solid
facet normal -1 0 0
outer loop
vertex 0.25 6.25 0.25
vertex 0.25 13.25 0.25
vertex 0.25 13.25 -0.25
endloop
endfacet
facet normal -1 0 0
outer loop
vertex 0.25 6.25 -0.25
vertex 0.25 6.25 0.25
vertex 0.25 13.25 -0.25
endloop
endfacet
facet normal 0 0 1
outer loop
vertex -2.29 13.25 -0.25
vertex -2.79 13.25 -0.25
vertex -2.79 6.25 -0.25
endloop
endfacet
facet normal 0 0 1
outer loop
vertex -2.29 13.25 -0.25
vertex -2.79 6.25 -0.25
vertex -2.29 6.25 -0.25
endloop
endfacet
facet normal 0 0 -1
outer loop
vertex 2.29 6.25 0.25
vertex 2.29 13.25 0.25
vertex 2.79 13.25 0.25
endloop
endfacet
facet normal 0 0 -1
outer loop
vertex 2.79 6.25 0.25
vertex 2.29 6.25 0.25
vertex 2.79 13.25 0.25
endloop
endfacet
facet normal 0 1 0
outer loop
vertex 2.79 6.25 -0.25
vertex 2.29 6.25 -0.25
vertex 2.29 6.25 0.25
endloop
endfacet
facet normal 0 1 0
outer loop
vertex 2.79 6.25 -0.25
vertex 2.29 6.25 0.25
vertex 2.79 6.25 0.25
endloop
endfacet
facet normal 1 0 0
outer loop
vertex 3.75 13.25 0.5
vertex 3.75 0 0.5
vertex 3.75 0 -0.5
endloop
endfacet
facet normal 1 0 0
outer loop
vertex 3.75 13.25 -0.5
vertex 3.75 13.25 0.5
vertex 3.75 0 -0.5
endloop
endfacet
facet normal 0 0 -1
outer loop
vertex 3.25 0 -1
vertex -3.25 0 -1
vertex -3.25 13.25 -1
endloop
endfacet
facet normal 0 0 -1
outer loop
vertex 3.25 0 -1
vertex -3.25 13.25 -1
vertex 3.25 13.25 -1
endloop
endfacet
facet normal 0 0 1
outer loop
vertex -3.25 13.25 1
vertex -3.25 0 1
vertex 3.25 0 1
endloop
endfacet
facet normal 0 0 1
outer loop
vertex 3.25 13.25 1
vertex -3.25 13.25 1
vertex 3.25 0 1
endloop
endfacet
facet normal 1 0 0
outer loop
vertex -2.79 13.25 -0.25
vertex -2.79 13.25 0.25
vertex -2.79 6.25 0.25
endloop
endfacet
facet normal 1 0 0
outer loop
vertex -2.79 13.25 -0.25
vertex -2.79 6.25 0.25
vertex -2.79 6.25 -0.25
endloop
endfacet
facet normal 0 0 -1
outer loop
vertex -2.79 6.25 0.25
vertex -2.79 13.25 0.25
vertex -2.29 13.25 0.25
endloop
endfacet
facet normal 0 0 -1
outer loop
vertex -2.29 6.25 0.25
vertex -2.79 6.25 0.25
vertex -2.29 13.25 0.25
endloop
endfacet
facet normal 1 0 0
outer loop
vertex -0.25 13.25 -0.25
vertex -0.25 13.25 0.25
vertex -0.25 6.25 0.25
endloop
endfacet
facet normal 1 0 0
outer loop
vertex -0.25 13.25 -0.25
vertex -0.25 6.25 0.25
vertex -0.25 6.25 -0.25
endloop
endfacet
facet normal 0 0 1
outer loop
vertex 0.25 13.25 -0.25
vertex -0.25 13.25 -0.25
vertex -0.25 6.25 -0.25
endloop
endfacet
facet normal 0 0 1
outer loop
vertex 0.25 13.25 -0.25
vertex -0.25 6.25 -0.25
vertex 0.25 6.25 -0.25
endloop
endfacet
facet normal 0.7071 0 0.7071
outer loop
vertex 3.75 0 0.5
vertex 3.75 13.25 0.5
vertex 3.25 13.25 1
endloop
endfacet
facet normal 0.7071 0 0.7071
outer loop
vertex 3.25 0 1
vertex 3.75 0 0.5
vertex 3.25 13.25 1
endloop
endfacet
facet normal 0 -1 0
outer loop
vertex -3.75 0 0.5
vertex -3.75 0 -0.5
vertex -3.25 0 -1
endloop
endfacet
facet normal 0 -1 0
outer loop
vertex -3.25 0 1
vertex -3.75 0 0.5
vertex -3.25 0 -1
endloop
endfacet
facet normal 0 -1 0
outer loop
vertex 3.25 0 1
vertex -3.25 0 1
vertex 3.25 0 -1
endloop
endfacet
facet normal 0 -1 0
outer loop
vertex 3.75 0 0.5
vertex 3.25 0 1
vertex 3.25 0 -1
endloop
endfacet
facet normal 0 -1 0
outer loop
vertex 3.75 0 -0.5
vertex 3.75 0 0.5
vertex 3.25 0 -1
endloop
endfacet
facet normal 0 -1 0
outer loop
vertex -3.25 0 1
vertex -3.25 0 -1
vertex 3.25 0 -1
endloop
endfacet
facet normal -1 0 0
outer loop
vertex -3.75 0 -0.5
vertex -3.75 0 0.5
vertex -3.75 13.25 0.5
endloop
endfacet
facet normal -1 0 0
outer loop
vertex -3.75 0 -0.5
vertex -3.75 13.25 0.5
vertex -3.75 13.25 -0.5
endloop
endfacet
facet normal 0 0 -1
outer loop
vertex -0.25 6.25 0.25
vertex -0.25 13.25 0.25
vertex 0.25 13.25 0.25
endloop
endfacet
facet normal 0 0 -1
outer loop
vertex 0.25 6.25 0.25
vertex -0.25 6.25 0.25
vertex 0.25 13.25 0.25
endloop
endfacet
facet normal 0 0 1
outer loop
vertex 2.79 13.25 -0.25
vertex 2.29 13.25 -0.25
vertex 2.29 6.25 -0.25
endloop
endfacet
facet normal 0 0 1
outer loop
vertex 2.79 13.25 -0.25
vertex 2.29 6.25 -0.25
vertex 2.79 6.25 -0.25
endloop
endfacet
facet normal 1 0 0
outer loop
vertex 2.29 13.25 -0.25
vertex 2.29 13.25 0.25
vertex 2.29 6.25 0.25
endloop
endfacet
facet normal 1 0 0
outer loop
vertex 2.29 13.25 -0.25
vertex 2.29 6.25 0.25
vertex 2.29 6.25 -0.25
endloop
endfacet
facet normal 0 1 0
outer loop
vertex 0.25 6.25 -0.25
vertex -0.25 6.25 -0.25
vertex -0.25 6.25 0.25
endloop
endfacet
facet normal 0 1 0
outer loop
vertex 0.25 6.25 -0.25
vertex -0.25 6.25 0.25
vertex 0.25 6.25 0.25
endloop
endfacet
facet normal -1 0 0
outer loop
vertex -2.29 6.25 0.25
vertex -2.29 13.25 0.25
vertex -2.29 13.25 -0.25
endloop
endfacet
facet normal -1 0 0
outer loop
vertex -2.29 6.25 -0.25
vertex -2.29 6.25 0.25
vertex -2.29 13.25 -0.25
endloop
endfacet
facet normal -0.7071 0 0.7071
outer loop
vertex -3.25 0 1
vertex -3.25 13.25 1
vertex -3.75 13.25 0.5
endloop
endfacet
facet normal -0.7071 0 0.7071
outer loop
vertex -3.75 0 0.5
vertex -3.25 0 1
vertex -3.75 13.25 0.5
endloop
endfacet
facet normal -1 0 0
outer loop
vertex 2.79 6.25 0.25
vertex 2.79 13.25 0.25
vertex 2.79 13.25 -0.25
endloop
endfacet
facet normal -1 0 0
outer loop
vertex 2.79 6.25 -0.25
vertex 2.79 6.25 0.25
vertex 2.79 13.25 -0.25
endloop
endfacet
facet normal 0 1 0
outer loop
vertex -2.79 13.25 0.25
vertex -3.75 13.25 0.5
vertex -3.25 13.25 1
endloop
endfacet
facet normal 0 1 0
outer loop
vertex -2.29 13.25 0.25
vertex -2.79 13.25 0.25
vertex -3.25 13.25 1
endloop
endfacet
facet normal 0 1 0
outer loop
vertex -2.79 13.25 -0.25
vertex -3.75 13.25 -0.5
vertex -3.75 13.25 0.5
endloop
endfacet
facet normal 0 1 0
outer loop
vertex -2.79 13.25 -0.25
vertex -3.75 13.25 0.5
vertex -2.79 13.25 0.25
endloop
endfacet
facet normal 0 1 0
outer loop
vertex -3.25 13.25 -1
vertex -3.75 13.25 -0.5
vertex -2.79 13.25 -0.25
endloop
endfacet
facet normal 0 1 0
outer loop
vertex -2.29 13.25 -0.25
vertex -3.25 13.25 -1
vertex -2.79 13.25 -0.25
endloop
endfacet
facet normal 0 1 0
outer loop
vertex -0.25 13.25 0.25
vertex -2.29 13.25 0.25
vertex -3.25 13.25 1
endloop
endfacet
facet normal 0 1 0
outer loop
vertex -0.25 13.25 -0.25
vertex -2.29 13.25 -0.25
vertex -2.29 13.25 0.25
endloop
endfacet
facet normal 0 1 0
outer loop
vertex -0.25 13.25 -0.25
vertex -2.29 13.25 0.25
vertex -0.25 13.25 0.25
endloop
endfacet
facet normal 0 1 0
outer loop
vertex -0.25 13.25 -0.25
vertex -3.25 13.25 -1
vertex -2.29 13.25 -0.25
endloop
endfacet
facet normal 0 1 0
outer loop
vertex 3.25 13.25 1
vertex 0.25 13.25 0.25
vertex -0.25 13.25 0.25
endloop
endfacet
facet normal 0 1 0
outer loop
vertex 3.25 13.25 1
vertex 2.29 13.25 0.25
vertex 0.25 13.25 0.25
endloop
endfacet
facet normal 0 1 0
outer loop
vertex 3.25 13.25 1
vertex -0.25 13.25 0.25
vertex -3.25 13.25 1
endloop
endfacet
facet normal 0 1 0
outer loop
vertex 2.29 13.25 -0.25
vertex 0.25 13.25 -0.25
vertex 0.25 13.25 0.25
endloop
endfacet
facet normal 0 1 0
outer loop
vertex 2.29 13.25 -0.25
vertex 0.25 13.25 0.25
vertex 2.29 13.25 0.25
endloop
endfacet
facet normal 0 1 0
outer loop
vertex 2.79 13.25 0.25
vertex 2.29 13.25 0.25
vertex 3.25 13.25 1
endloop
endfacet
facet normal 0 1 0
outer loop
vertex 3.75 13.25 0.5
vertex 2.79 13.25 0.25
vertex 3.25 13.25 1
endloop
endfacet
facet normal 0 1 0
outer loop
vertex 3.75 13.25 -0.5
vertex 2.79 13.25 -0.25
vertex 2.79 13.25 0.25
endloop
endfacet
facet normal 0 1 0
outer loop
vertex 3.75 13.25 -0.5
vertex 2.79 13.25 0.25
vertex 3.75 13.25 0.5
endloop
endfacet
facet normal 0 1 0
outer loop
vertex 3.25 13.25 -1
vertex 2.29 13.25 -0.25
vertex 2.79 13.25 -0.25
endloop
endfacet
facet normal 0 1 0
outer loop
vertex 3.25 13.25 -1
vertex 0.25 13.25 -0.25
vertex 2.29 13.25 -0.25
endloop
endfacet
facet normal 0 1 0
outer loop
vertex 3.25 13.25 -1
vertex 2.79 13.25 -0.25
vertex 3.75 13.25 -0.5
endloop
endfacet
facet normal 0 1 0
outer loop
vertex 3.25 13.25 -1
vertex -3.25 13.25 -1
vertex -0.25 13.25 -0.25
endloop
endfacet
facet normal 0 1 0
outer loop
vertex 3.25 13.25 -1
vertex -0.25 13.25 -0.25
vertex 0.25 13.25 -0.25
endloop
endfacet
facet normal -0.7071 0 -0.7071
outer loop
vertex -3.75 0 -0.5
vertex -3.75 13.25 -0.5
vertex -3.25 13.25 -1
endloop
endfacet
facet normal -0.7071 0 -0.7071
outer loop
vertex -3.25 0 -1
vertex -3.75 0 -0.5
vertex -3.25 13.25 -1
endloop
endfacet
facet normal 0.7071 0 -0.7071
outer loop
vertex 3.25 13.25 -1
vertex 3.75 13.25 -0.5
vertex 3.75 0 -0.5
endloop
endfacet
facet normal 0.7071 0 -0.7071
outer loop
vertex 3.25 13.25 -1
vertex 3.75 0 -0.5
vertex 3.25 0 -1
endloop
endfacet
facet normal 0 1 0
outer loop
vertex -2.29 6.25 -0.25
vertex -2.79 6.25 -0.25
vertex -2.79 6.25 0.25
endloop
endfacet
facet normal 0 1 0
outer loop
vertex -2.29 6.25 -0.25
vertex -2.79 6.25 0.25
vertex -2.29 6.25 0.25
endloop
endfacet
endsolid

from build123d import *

# Parameters (mm, degrees)
SKETCH_1_W          = 7.5
SKETCH_1_H          = 2
EXTRUDE_1_DEPTH     = 13.25
CUT_EXTRUDE_START   = 13.25
SKETCH_2_W          = 0.5
SKETCH_2_H          = 0.5
CUT_EXTRUDE_1_DEPTH = 7
CUT_EXTRUDE_2_DEPTH = 14.806701271


with BuildPart() as part:
    # 草图1 → 凸台-拉伸1 (new body)
    with BuildSketch(Plane(origin=(0, 0, 0), x_dir=(1, 0, 0), z_dir=(0, 1, 0))):
        Rectangle(SKETCH_1_W, SKETCH_1_H)
    extrude(amount=EXTRUDE_1_DEPTH)

    # 草图2 → 切除-拉伸1 (cut)
    with BuildSketch(Plane(origin=(0, 0, 0), x_dir=(1, 0, 0), z_dir=(0, 1, 0)).offset(CUT_EXTRUDE_START)):
        with Locations((2.54, 0)):
            Rectangle(SKETCH_2_W, SKETCH_2_H)
        Rectangle(SKETCH_2_W, SKETCH_2_H)
        with Locations((-2.54, 0)):
            Rectangle(SKETCH_2_W, SKETCH_2_H)
    extrude(amount=-CUT_EXTRUDE_1_DEPTH, mode=Mode.SUBTRACT)

    # 草图3 → 切除-拉伸2 (cut, through all)
    with BuildSketch(Plane(origin=(0, 0, 0), x_dir=(1, 0, 0), z_dir=(0, 1, 0))):
        Polygon((-3.25, -1), (-3.75, -0.5), (-3.75, -1), align=None)
        Polygon((-3.75, 0.5), (-3.25, 1), (-3.75, 1), align=None)
        Polygon((3.75, -0.5), (3.25, -1), (3.75, -1), align=None)
        Polygon((3.25, 1), (3.75, 1), (3.75, 0.5), align=None)
    extrude(amount=CUT_EXTRUDE_2_DEPTH, mode=Mode.SUBTRACT)


solid = part.part
